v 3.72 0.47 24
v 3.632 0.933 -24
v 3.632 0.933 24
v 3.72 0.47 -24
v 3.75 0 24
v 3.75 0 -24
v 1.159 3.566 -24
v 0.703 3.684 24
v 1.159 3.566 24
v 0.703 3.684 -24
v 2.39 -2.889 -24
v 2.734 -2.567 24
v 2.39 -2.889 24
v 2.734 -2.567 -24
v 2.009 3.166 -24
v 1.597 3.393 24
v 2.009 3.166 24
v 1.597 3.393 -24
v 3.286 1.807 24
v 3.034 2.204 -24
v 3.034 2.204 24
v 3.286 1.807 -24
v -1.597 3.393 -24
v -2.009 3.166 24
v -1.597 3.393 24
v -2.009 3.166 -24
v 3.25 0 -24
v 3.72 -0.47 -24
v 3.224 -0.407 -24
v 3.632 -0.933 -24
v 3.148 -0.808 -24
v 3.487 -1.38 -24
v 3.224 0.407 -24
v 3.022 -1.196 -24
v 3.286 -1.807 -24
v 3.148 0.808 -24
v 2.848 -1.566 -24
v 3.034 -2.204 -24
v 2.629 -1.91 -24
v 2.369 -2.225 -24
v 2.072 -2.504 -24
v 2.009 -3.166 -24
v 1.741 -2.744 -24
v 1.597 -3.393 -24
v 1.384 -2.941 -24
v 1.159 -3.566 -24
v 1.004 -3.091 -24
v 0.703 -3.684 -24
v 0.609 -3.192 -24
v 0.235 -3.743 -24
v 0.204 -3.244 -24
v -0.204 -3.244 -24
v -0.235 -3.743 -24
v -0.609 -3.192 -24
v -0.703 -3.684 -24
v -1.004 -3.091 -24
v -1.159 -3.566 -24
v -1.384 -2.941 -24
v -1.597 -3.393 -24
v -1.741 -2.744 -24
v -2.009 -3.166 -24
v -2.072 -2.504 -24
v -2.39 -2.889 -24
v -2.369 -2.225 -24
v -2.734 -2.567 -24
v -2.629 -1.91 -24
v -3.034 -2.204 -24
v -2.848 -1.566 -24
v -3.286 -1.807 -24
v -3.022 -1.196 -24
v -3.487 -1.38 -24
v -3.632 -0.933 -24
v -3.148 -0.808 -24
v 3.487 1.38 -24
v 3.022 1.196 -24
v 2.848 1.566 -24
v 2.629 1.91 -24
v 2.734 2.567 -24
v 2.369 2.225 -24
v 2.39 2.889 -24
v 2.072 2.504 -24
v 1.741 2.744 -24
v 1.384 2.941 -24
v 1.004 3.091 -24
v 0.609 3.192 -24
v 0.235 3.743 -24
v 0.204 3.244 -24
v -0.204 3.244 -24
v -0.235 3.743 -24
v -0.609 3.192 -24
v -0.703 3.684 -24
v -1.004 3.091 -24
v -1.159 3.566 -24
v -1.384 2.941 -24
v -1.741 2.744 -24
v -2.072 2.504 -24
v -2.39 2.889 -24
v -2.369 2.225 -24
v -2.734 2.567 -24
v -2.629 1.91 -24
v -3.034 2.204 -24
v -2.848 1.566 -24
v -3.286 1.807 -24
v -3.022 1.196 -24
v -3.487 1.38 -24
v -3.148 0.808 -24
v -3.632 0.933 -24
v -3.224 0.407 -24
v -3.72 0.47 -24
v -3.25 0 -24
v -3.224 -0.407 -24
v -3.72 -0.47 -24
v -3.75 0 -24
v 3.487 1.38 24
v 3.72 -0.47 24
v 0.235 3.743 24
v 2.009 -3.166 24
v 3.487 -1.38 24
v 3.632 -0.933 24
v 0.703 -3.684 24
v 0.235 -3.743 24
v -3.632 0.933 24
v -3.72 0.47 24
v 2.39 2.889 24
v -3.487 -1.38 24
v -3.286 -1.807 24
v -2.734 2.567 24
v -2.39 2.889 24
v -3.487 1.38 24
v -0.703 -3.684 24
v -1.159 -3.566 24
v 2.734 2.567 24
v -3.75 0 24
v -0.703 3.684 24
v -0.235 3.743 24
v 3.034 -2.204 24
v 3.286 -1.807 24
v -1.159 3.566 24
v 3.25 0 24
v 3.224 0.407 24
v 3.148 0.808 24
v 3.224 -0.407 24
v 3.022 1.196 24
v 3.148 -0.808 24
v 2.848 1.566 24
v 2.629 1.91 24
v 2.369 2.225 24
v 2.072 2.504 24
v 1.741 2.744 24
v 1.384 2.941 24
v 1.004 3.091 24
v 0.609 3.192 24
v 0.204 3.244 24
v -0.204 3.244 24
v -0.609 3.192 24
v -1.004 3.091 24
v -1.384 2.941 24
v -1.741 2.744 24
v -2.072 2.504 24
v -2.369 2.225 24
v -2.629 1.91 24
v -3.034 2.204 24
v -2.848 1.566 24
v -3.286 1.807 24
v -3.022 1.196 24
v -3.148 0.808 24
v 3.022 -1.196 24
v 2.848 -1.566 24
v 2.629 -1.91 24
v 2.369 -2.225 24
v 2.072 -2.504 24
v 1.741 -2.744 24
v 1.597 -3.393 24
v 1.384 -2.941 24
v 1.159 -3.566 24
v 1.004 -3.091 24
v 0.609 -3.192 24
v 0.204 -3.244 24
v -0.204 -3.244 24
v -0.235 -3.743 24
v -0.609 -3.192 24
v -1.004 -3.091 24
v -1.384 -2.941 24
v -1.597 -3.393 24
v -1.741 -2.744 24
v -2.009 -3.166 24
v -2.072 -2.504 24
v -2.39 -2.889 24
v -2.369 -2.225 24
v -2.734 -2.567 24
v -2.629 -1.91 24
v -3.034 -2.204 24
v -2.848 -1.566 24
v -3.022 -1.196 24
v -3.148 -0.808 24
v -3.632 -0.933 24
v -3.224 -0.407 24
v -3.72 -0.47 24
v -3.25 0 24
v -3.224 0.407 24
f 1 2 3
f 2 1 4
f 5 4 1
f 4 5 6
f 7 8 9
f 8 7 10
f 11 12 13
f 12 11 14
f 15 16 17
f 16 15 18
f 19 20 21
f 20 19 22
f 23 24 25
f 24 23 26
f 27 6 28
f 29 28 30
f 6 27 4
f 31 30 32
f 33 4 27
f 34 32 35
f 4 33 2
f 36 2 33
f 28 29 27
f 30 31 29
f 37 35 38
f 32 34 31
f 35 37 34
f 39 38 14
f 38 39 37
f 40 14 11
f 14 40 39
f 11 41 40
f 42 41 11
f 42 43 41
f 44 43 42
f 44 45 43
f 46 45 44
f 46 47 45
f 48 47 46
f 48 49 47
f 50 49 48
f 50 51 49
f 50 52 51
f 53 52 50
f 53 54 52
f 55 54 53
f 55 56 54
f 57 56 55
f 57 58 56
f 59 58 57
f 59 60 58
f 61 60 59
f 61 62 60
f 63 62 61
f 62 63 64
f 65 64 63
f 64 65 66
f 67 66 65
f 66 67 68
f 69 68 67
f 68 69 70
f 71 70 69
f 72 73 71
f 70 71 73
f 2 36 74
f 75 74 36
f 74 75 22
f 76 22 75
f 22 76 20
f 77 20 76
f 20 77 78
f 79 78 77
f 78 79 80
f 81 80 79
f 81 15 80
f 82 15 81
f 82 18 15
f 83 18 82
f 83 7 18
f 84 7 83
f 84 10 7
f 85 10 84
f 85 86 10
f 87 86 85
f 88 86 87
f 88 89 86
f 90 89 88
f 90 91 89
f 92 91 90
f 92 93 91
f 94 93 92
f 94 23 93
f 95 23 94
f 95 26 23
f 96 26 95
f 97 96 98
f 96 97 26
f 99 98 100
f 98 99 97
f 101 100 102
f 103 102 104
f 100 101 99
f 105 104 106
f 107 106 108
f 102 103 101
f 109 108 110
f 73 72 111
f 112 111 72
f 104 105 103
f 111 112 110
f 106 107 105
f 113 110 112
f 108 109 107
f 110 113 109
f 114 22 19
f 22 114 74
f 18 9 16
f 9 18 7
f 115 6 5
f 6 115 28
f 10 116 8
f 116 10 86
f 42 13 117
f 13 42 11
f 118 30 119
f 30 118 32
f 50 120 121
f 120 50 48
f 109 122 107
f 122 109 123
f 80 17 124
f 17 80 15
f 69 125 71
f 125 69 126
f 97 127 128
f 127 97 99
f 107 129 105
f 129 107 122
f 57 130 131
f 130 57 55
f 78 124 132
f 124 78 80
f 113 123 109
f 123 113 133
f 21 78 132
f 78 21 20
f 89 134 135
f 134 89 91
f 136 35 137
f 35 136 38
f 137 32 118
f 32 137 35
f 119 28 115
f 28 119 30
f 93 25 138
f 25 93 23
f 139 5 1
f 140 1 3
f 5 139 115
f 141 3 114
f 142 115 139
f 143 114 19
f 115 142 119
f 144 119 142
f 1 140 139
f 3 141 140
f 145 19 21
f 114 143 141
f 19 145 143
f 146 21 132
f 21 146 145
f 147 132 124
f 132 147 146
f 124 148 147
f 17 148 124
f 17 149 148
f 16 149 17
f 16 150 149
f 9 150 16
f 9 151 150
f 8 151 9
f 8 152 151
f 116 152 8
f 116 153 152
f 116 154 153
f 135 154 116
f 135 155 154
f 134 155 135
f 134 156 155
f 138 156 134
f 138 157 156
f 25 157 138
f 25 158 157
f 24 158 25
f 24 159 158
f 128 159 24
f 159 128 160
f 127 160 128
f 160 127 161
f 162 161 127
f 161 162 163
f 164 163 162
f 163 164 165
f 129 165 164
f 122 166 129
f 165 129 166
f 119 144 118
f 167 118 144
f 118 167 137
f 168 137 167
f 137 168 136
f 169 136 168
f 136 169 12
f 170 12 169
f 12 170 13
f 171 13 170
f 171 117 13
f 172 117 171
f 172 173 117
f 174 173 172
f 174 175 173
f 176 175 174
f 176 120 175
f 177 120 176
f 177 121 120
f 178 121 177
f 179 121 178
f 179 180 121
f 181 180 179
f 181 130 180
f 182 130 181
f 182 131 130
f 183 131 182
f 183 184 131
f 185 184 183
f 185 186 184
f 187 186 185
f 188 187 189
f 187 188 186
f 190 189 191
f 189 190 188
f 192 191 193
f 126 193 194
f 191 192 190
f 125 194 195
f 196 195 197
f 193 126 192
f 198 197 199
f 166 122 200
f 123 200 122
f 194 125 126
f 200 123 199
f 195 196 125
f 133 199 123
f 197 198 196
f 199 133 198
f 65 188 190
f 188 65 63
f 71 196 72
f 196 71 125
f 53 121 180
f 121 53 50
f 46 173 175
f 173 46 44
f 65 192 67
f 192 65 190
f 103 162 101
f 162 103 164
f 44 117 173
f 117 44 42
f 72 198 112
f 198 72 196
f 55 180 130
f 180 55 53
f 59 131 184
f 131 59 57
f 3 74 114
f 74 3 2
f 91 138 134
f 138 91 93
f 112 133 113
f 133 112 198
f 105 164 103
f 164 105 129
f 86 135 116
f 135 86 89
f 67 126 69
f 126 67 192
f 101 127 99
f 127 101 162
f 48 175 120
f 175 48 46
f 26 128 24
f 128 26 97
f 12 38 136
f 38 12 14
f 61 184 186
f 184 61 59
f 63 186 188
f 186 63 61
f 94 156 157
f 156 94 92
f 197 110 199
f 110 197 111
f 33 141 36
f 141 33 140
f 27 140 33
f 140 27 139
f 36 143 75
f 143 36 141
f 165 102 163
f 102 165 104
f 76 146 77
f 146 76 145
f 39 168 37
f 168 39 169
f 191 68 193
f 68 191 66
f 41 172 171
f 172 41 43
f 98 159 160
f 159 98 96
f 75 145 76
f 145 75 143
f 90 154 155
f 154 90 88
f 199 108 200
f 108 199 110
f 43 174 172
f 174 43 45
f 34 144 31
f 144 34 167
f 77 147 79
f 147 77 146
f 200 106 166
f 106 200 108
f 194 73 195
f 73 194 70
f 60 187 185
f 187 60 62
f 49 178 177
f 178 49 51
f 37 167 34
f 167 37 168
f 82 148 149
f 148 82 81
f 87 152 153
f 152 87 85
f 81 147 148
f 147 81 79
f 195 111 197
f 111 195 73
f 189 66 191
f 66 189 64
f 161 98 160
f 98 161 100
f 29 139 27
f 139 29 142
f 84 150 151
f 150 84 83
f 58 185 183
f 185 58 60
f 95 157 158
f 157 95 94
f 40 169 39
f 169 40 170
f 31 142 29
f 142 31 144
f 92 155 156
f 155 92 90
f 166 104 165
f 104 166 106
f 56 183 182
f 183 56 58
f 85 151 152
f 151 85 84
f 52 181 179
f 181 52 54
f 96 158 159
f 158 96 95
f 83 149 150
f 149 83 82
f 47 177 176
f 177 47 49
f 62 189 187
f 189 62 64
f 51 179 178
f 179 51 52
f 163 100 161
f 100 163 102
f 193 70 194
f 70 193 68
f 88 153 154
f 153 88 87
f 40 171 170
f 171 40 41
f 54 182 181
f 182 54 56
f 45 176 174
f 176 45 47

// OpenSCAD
$fn = 50;


difference() {
	union() {
		translate(v = [0, 0, -24.0000000000]) {
			cylinder(h = 48, r = 3.7500000000);
		}
	}
	union() {
		translate(v = [0, 0, -100.0000000000]) {
			cylinder(h = 200, r = 3.2500000000);
		}
	}
}
